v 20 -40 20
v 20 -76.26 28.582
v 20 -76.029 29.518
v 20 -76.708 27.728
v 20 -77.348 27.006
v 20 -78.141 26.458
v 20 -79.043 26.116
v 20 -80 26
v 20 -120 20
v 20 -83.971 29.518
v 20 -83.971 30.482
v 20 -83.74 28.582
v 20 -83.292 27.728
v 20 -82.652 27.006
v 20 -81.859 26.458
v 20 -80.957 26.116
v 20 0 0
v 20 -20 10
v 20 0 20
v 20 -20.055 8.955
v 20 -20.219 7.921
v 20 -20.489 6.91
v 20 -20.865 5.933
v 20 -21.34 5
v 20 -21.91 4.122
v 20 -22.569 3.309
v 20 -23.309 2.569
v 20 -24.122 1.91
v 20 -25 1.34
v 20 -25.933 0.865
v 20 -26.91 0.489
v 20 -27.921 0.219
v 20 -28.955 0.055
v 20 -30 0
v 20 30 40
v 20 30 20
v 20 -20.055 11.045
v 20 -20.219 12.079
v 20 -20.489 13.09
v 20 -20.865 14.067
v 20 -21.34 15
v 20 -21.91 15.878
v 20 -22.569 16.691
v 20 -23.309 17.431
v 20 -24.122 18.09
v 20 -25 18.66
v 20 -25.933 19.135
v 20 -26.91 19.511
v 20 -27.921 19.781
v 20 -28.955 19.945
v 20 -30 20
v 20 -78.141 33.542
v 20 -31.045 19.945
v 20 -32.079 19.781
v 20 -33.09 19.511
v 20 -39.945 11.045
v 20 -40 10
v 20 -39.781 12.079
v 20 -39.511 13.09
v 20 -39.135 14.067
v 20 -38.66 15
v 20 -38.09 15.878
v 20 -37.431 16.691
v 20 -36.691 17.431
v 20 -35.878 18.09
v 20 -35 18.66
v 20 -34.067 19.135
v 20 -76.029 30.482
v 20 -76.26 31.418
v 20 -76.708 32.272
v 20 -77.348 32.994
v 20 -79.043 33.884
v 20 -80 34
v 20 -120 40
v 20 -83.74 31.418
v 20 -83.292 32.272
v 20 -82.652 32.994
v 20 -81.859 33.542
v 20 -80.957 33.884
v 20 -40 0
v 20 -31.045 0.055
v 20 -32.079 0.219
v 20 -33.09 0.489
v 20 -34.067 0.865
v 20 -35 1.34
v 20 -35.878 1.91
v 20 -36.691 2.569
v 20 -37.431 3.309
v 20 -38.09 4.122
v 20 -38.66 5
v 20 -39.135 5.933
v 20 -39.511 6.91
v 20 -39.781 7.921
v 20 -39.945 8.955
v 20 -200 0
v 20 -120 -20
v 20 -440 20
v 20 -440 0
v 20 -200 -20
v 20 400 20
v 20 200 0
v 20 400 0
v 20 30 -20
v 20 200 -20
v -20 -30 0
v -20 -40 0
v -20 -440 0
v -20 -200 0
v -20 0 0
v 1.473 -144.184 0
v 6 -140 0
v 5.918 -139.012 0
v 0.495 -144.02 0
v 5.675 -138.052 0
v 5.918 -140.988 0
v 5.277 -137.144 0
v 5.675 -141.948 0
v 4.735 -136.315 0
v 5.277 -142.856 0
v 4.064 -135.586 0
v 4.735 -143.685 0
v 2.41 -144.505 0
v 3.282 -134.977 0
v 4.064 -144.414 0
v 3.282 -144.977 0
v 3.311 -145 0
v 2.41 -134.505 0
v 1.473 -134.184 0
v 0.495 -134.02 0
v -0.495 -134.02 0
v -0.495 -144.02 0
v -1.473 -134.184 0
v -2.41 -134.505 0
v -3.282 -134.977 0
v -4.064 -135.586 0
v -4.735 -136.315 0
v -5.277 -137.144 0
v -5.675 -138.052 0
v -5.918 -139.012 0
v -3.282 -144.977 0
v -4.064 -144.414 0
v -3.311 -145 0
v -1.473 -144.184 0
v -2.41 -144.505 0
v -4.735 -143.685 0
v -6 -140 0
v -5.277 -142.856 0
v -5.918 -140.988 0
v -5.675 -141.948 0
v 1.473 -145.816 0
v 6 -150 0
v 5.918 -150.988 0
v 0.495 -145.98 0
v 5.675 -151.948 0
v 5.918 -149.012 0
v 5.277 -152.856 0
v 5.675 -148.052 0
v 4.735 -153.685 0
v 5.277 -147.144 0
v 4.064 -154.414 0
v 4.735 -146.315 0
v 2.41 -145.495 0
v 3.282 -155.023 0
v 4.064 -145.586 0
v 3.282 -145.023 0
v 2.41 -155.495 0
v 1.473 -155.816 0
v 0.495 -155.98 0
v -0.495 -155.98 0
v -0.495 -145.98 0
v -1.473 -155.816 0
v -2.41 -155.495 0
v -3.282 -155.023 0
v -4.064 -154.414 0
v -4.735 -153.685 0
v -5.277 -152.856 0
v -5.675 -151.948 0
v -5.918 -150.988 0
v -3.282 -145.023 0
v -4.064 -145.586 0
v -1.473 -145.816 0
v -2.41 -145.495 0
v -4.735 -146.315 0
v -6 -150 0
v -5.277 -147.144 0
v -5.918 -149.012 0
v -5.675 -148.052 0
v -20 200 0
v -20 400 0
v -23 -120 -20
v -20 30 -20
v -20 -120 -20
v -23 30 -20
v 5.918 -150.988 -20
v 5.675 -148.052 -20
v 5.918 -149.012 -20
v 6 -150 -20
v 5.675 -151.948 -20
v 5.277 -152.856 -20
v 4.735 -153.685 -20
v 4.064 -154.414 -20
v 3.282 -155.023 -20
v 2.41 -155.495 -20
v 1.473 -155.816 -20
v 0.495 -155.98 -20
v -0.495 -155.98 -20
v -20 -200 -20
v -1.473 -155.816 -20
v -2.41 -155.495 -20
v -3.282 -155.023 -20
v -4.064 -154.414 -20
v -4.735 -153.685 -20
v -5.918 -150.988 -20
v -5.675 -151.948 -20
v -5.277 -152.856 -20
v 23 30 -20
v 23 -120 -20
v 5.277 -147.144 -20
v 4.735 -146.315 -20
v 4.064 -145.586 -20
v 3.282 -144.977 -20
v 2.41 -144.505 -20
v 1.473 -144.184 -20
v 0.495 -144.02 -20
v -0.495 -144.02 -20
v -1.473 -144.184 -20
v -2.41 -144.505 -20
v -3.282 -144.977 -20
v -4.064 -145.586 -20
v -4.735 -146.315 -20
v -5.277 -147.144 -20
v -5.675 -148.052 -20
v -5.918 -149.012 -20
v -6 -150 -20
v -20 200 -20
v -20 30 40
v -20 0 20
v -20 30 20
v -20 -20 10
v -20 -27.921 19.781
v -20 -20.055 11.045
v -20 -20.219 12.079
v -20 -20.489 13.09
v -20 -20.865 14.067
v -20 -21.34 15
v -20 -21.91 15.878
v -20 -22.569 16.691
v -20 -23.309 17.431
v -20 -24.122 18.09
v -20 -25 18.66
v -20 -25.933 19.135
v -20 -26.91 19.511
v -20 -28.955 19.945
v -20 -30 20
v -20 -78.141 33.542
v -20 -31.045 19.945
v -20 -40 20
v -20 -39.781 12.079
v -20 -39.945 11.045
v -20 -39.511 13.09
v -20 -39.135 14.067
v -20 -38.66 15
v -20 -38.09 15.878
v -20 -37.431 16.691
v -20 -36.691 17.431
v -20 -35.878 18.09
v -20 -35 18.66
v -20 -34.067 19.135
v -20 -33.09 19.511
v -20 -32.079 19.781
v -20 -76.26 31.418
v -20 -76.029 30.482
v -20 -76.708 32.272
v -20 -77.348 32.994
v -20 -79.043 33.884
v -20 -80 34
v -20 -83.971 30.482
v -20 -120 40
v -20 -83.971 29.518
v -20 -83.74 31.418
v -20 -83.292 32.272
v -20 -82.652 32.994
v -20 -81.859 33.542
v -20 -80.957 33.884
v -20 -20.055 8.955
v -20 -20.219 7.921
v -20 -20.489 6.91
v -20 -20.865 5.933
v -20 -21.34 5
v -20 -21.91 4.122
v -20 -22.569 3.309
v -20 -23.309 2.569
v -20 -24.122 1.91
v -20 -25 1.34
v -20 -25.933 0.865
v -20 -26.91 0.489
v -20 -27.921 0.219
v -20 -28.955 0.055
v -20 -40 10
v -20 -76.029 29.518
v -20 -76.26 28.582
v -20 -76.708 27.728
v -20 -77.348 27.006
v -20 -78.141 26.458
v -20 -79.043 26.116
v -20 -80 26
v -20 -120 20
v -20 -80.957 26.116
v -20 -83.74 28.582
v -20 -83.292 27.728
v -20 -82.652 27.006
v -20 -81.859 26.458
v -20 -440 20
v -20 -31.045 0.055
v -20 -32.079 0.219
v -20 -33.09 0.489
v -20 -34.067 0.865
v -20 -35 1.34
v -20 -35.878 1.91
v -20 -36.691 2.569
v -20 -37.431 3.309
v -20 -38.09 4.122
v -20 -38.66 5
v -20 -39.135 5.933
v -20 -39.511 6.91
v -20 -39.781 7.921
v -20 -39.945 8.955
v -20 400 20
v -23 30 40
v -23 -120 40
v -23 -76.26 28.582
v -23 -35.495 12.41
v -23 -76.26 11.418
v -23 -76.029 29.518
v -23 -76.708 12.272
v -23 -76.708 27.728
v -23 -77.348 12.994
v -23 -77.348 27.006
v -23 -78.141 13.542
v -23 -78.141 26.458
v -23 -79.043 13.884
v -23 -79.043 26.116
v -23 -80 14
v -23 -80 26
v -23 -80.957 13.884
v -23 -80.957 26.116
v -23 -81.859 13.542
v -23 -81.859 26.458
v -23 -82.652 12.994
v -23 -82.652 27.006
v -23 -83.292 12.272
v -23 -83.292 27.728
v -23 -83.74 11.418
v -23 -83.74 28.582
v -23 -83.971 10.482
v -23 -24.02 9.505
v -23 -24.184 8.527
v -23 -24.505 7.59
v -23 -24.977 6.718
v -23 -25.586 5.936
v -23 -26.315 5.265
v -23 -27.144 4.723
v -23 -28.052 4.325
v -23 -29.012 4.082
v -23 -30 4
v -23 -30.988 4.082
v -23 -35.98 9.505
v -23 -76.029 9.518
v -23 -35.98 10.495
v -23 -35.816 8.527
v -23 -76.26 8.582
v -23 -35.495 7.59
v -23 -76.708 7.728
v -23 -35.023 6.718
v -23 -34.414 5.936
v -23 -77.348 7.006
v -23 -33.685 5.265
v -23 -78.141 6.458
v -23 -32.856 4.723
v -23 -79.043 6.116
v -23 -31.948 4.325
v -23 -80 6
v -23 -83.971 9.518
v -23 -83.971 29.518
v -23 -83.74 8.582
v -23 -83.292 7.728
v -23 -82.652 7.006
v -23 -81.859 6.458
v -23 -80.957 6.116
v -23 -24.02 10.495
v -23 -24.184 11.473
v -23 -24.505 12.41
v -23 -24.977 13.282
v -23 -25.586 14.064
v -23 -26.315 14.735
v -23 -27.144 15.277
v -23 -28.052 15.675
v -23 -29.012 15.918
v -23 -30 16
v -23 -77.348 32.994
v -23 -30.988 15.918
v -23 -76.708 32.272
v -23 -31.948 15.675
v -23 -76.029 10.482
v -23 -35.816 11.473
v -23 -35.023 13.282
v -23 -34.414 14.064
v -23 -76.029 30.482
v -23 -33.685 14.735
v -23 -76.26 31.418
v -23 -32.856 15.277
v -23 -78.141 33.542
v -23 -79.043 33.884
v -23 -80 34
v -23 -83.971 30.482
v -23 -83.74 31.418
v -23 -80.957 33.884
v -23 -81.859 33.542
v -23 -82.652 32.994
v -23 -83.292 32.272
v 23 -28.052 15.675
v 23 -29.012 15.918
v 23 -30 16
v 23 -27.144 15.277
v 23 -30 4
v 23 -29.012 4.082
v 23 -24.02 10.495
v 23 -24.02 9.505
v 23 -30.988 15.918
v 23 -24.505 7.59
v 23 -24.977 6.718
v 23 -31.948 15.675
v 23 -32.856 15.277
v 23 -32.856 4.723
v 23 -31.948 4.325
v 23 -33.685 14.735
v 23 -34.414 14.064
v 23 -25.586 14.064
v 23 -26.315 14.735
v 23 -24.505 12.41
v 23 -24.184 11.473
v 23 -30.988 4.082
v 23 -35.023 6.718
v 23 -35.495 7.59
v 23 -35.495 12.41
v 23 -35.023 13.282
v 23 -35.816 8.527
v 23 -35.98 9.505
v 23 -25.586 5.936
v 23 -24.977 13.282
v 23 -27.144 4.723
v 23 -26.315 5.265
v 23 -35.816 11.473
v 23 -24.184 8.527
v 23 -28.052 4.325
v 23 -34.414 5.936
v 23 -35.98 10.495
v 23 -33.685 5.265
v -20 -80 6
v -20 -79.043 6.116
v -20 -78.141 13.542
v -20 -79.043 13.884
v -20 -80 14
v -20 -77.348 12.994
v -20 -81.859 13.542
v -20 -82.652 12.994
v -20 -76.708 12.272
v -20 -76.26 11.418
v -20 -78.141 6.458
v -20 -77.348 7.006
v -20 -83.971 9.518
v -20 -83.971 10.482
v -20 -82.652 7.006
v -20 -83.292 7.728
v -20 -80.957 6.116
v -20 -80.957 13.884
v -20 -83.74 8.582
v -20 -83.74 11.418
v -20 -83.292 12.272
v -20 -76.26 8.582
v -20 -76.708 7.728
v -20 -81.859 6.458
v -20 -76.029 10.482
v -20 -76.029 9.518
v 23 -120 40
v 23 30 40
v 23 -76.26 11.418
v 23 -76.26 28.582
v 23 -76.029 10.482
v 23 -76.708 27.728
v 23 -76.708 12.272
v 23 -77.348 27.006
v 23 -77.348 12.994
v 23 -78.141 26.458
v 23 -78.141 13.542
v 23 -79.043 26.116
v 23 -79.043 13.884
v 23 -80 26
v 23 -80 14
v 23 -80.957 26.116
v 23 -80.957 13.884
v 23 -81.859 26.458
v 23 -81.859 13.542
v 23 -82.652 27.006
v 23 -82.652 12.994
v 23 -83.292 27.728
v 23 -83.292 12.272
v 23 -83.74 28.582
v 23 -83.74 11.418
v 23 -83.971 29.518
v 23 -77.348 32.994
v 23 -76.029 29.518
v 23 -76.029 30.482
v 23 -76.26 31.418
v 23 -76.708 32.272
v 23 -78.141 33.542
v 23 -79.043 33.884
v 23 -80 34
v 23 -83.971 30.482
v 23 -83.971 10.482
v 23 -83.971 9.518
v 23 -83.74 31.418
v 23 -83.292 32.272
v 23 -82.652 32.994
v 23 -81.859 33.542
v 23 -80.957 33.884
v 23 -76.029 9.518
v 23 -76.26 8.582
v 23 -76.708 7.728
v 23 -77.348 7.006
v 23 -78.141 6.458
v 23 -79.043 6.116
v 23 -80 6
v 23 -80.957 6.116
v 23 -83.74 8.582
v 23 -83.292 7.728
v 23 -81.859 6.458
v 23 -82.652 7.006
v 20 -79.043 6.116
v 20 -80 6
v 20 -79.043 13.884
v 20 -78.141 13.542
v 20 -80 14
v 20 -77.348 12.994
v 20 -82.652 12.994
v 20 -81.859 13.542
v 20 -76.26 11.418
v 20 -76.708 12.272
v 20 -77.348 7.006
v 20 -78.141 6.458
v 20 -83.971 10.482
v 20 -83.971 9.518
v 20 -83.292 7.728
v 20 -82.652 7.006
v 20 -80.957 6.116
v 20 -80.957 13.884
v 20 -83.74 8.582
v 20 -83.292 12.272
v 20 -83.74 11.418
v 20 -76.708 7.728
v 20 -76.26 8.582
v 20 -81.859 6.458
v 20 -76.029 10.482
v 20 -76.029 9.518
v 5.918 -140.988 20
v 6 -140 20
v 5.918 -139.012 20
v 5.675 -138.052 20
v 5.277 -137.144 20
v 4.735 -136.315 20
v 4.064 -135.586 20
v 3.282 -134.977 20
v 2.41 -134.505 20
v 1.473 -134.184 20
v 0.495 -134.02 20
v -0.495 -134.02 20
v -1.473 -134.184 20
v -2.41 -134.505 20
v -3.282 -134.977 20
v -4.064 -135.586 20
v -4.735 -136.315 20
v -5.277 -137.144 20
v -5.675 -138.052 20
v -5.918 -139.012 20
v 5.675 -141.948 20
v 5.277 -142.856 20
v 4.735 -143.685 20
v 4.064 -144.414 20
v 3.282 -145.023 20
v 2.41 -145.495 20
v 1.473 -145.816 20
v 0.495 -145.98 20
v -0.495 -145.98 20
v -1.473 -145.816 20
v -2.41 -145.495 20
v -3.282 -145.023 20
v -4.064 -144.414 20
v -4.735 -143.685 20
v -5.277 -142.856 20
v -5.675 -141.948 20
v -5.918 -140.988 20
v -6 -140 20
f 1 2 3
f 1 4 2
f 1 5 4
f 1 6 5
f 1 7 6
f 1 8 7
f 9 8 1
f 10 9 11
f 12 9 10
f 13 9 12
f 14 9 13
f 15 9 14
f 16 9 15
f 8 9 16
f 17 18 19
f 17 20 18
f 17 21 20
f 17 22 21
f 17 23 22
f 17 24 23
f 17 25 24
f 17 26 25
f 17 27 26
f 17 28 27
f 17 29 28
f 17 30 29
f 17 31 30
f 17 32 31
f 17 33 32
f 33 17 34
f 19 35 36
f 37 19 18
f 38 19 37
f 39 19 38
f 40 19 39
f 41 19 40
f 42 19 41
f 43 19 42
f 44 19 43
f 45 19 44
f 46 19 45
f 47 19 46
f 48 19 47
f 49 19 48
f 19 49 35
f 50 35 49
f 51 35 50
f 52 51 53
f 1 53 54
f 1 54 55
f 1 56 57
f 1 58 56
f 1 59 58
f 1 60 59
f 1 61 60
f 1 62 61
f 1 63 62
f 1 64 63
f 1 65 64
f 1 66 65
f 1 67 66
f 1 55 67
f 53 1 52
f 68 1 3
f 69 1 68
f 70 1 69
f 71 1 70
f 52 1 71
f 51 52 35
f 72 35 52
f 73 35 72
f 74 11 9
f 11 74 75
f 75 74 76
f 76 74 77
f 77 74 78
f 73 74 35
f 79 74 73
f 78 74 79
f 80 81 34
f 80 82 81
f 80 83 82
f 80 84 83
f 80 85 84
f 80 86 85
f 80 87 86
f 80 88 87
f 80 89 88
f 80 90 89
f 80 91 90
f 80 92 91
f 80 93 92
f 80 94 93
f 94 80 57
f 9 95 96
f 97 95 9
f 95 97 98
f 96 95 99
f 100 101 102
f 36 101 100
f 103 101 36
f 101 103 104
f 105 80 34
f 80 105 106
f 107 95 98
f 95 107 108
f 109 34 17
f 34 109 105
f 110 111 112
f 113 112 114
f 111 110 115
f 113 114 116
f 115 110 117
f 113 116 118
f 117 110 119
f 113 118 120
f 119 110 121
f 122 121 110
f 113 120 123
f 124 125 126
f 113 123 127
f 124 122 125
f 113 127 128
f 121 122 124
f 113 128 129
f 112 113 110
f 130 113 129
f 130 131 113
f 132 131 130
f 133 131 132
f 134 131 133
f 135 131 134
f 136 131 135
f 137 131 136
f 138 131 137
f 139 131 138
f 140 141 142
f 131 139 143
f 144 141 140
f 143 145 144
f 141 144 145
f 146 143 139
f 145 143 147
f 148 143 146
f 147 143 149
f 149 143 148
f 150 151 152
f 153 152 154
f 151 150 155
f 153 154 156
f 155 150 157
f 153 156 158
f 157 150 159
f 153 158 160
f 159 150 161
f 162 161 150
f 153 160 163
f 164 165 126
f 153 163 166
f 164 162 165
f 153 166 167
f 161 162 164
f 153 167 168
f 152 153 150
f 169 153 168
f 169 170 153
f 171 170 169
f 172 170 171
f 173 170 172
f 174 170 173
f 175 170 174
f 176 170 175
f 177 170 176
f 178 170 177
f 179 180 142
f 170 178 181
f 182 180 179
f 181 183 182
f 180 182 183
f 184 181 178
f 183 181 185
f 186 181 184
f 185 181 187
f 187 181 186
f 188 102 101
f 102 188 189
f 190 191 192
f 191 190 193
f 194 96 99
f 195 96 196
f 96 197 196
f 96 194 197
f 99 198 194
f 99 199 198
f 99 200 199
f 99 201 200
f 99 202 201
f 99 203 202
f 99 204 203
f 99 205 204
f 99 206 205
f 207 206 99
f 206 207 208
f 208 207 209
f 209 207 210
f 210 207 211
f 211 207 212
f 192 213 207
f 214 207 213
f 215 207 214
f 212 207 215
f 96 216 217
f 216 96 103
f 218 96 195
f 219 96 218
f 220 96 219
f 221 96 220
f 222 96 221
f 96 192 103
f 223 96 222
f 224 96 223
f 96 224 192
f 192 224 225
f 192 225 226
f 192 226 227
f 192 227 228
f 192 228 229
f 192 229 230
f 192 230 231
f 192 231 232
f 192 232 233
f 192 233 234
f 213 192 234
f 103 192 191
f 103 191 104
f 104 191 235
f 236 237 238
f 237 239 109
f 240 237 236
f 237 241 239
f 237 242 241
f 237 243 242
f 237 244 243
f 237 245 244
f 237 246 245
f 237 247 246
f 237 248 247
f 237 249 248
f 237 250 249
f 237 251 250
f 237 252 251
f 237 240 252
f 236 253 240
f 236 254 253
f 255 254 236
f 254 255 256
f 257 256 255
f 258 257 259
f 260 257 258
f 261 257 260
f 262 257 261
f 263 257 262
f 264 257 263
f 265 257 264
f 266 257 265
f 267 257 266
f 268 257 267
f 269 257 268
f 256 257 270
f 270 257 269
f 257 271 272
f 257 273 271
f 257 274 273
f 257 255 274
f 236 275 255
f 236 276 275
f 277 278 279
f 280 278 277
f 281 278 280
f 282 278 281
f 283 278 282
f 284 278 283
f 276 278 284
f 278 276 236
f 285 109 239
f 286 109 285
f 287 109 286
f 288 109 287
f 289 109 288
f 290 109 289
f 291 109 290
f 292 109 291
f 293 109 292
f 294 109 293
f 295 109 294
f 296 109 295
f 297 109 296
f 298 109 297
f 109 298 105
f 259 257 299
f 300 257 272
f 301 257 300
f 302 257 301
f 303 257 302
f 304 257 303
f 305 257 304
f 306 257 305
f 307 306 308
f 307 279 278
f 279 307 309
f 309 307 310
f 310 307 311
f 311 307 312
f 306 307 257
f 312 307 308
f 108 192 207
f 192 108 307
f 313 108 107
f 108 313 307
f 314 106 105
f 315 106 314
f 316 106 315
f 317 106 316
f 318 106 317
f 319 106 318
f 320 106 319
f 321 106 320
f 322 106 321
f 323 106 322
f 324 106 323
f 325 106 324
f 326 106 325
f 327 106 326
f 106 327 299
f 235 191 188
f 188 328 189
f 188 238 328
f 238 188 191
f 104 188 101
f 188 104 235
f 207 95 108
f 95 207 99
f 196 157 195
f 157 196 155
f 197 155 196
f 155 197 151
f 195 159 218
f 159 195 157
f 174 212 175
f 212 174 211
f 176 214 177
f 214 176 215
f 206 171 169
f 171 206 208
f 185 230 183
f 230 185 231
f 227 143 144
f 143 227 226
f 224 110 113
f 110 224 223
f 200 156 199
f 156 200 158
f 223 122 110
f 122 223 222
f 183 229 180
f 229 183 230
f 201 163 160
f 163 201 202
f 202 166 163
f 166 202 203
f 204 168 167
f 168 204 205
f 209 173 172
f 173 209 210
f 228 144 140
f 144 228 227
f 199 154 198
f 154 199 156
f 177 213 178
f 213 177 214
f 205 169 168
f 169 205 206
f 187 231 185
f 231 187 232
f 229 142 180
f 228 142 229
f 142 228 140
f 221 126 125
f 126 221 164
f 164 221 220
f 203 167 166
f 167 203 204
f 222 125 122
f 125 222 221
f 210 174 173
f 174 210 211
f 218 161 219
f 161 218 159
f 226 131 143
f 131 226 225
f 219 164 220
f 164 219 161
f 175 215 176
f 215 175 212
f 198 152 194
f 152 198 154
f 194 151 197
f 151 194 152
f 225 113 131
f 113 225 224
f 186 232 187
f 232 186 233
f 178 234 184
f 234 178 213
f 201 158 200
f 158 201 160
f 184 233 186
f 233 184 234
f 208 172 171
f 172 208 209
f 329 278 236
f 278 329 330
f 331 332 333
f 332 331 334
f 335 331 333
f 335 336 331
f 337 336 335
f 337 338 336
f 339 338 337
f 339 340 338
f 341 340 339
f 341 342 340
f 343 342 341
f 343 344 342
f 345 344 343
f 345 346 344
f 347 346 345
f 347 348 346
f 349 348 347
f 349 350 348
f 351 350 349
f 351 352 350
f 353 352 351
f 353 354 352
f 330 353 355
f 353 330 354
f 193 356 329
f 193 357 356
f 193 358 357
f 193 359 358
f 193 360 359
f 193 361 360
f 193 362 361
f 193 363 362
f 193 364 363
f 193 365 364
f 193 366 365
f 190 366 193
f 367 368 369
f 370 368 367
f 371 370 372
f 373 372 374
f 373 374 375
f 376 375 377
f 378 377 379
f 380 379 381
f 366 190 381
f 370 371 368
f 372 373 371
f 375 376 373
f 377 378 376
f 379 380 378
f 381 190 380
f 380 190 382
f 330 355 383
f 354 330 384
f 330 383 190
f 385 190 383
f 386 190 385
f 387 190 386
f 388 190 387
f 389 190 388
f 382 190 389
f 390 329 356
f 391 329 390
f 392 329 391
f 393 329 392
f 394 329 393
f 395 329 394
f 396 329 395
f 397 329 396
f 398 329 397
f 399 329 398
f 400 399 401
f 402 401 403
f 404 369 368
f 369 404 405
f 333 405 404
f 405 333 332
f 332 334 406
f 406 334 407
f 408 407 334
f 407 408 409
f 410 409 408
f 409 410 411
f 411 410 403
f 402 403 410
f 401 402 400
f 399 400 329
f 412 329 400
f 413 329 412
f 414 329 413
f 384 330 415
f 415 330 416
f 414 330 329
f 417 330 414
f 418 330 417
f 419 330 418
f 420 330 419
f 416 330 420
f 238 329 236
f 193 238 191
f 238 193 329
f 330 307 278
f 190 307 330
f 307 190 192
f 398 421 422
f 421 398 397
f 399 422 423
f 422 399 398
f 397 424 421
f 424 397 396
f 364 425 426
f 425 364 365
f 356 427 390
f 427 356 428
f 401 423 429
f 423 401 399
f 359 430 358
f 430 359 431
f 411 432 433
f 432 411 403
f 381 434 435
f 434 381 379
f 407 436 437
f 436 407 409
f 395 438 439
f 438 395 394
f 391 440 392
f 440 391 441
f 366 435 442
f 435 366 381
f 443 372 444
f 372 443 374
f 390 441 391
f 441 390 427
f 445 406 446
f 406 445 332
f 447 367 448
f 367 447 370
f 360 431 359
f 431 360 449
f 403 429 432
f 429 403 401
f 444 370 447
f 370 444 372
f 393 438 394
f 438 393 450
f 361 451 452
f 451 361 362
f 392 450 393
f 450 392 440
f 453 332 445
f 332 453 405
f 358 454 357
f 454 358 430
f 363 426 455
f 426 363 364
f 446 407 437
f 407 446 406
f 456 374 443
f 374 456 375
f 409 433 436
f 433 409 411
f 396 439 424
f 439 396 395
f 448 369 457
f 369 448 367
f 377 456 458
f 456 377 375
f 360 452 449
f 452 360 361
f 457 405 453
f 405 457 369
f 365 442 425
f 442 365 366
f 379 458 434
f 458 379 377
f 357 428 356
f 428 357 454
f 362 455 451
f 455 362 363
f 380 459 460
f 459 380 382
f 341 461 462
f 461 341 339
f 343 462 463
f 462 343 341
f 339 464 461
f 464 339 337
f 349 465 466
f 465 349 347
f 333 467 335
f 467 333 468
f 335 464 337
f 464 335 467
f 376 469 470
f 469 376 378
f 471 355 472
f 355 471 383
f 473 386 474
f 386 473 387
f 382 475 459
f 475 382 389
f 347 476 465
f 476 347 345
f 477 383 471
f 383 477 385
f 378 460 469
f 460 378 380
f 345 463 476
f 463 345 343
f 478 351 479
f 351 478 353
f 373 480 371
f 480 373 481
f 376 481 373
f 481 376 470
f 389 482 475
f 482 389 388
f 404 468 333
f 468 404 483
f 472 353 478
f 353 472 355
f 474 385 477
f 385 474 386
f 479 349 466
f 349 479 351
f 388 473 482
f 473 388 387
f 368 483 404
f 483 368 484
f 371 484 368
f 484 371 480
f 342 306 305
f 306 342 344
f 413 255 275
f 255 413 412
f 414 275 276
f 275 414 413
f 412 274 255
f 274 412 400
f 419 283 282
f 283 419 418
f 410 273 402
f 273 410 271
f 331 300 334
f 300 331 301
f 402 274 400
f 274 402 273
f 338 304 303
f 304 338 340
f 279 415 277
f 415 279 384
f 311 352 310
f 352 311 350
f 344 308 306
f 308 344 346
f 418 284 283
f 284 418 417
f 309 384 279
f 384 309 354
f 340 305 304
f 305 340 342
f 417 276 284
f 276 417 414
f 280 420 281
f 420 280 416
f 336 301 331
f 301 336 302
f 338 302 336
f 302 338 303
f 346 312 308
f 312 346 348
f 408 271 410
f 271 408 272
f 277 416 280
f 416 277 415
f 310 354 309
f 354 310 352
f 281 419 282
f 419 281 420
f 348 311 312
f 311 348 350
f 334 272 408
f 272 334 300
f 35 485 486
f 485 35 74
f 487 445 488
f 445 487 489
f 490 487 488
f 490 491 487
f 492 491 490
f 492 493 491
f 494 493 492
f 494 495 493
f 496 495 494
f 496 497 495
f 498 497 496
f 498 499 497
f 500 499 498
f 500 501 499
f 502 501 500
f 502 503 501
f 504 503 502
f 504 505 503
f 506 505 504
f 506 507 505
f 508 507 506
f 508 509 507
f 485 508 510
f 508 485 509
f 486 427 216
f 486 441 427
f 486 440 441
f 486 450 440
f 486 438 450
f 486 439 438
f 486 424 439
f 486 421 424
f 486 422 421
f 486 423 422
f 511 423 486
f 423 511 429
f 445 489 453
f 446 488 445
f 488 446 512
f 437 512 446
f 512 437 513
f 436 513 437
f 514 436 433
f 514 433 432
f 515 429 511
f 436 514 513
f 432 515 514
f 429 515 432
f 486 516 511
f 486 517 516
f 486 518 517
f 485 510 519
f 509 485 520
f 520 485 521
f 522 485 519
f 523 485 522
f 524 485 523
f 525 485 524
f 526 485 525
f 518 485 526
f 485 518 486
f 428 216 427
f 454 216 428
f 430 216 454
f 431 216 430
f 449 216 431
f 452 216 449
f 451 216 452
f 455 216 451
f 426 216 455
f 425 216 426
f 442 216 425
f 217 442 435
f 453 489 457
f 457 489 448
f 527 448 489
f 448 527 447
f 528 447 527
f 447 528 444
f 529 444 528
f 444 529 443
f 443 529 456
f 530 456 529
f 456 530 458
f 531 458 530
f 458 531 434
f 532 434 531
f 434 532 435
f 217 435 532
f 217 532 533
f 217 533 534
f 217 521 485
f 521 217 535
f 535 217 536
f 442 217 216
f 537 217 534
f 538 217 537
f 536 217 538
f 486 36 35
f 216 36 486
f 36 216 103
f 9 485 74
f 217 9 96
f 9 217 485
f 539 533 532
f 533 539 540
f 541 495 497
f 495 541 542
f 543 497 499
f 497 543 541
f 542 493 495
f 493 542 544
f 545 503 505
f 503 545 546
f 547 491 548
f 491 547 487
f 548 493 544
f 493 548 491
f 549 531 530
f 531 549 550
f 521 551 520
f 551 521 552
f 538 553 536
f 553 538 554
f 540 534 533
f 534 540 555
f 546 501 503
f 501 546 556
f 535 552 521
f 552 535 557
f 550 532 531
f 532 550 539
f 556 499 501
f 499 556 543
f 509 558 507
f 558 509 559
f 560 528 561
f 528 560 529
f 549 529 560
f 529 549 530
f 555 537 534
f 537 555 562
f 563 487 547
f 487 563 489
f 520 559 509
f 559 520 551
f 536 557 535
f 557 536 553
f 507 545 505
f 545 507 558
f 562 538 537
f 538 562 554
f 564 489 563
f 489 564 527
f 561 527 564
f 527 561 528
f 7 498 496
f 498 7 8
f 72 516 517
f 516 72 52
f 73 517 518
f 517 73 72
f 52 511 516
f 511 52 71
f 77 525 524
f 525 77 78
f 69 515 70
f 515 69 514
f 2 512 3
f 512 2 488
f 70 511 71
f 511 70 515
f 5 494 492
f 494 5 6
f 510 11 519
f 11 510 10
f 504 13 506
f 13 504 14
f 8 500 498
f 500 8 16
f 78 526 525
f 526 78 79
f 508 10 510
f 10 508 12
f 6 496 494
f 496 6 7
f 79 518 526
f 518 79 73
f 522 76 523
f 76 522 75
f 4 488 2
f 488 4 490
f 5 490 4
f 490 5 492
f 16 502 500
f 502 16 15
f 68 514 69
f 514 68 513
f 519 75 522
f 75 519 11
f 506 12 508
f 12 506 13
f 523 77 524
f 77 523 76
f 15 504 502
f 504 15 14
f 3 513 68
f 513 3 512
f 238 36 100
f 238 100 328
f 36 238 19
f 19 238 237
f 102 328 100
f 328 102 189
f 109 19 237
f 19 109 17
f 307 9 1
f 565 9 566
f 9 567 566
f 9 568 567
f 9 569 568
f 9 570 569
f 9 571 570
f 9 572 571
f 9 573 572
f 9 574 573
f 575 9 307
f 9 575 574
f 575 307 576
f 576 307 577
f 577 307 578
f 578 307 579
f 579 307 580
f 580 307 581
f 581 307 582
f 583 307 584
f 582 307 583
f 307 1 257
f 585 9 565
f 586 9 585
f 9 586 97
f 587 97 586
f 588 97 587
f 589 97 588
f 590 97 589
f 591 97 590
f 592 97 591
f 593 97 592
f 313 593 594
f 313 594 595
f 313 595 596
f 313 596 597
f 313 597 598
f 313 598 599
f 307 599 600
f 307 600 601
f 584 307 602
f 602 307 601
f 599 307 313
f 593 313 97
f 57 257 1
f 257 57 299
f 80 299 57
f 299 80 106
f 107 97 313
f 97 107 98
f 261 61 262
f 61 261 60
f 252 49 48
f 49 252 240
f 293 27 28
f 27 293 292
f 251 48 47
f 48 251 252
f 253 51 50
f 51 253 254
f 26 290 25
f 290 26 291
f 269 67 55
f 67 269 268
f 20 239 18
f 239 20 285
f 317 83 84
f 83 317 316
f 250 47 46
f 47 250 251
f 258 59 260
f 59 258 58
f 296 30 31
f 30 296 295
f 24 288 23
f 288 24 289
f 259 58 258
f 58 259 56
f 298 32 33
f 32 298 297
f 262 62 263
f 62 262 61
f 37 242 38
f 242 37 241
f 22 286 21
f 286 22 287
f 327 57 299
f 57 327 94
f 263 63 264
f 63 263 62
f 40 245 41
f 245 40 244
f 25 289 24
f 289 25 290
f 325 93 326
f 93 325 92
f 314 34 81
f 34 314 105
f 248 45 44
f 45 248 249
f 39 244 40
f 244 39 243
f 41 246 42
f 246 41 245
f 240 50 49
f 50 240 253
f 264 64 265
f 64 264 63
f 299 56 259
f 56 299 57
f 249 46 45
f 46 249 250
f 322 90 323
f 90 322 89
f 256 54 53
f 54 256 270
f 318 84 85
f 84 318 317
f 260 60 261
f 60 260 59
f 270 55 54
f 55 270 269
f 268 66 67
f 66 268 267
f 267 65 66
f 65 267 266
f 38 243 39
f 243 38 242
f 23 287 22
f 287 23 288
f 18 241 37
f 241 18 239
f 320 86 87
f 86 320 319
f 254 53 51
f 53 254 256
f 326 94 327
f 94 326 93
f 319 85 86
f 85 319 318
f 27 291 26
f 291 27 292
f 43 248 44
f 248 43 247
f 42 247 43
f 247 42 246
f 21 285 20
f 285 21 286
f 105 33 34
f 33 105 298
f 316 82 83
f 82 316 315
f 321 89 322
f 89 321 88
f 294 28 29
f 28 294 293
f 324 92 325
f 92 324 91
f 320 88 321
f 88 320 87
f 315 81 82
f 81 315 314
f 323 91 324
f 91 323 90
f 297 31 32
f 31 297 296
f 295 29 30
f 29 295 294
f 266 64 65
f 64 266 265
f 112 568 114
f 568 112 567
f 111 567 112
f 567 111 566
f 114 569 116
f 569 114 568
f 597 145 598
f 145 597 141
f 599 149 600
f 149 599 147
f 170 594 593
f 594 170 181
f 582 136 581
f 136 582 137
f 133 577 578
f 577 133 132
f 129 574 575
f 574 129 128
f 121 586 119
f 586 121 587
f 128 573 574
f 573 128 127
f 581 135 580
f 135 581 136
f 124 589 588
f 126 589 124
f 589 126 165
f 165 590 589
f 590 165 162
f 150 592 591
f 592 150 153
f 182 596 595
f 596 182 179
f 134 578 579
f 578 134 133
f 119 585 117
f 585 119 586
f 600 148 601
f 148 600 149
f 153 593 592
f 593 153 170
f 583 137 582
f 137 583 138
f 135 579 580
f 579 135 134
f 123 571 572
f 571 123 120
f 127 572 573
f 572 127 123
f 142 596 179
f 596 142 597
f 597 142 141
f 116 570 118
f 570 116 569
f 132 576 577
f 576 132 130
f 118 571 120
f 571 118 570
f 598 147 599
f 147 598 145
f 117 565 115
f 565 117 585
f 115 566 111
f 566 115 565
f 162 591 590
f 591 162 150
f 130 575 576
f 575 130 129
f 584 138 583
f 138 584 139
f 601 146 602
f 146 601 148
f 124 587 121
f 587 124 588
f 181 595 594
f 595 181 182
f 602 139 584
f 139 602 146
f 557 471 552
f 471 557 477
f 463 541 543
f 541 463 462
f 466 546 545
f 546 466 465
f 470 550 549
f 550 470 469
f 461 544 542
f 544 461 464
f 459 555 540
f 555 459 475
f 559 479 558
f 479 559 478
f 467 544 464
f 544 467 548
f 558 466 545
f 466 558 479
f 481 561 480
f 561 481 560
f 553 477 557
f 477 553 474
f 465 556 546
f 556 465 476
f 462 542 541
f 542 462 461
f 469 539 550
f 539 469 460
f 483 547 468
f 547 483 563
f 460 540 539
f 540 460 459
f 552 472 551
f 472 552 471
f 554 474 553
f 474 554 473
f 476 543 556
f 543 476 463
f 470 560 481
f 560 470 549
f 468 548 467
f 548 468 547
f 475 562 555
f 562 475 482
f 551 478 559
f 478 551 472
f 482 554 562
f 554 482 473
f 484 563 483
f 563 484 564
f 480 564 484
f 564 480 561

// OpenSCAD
use <../../config.scad>

$fs=$fs/2;
$fa=$fa/2;

/*translate([-20,0,0])cube([40,800,20]);



translate([-20,0,10]) rotate([0,90,0]) cylinder(r=10, 100);

translate([20,0,10]) rotate([0,90,0]) cylinder(r=20, 20);
rotate([-20,0,0]){
    translate([30,0,-10]) cube([10,300,40]);
    translate([30,-20,-10]) cube([10,40,100]);
}*/

module plaque(){
    difference(){
        translate([0,30,0])cube([60,150,3]);
        translate([30,150-30, -30]) cylinder(r=6, 80);
        translate([30,150-80, -30]) cylinder(r=4, 80);
        translate([50,150-80, -30]) cylinder(r=4, 80);
    }
}

module element(){
    difference(){
        union(){
            translate([-20,-400,0])cube([40,400,20]);
            translate([20,10,10]) rotate([0,-90,0]) cylinder(r=10, 40);
            
        }
        translate([21,10,10]) rotate([0,-90,0]) cylinder(r=6, 42);
        translate([0,-100, -30]) cylinder(r=6, 80);
        translate([21,-40,10]) rotate([0,-90,0]) cylinder(r=4, 42);
    }
}

module support(){
    union(){
        translate([-20,0,0])cube([40,400,20]);
        difference(){
            translate([-20,-200,-20])cube([40,400,20]);
            translate([0,-150, -30]) cylinder(r=6, 80);
        }
        translate([-20,-150,-20]) rotate([0,-90,0]) plaque();
        translate([23,-150,-20]) rotate([0,-90,0]) plaque();
        
    }
}

support();
translate([0,-40,0])element();
